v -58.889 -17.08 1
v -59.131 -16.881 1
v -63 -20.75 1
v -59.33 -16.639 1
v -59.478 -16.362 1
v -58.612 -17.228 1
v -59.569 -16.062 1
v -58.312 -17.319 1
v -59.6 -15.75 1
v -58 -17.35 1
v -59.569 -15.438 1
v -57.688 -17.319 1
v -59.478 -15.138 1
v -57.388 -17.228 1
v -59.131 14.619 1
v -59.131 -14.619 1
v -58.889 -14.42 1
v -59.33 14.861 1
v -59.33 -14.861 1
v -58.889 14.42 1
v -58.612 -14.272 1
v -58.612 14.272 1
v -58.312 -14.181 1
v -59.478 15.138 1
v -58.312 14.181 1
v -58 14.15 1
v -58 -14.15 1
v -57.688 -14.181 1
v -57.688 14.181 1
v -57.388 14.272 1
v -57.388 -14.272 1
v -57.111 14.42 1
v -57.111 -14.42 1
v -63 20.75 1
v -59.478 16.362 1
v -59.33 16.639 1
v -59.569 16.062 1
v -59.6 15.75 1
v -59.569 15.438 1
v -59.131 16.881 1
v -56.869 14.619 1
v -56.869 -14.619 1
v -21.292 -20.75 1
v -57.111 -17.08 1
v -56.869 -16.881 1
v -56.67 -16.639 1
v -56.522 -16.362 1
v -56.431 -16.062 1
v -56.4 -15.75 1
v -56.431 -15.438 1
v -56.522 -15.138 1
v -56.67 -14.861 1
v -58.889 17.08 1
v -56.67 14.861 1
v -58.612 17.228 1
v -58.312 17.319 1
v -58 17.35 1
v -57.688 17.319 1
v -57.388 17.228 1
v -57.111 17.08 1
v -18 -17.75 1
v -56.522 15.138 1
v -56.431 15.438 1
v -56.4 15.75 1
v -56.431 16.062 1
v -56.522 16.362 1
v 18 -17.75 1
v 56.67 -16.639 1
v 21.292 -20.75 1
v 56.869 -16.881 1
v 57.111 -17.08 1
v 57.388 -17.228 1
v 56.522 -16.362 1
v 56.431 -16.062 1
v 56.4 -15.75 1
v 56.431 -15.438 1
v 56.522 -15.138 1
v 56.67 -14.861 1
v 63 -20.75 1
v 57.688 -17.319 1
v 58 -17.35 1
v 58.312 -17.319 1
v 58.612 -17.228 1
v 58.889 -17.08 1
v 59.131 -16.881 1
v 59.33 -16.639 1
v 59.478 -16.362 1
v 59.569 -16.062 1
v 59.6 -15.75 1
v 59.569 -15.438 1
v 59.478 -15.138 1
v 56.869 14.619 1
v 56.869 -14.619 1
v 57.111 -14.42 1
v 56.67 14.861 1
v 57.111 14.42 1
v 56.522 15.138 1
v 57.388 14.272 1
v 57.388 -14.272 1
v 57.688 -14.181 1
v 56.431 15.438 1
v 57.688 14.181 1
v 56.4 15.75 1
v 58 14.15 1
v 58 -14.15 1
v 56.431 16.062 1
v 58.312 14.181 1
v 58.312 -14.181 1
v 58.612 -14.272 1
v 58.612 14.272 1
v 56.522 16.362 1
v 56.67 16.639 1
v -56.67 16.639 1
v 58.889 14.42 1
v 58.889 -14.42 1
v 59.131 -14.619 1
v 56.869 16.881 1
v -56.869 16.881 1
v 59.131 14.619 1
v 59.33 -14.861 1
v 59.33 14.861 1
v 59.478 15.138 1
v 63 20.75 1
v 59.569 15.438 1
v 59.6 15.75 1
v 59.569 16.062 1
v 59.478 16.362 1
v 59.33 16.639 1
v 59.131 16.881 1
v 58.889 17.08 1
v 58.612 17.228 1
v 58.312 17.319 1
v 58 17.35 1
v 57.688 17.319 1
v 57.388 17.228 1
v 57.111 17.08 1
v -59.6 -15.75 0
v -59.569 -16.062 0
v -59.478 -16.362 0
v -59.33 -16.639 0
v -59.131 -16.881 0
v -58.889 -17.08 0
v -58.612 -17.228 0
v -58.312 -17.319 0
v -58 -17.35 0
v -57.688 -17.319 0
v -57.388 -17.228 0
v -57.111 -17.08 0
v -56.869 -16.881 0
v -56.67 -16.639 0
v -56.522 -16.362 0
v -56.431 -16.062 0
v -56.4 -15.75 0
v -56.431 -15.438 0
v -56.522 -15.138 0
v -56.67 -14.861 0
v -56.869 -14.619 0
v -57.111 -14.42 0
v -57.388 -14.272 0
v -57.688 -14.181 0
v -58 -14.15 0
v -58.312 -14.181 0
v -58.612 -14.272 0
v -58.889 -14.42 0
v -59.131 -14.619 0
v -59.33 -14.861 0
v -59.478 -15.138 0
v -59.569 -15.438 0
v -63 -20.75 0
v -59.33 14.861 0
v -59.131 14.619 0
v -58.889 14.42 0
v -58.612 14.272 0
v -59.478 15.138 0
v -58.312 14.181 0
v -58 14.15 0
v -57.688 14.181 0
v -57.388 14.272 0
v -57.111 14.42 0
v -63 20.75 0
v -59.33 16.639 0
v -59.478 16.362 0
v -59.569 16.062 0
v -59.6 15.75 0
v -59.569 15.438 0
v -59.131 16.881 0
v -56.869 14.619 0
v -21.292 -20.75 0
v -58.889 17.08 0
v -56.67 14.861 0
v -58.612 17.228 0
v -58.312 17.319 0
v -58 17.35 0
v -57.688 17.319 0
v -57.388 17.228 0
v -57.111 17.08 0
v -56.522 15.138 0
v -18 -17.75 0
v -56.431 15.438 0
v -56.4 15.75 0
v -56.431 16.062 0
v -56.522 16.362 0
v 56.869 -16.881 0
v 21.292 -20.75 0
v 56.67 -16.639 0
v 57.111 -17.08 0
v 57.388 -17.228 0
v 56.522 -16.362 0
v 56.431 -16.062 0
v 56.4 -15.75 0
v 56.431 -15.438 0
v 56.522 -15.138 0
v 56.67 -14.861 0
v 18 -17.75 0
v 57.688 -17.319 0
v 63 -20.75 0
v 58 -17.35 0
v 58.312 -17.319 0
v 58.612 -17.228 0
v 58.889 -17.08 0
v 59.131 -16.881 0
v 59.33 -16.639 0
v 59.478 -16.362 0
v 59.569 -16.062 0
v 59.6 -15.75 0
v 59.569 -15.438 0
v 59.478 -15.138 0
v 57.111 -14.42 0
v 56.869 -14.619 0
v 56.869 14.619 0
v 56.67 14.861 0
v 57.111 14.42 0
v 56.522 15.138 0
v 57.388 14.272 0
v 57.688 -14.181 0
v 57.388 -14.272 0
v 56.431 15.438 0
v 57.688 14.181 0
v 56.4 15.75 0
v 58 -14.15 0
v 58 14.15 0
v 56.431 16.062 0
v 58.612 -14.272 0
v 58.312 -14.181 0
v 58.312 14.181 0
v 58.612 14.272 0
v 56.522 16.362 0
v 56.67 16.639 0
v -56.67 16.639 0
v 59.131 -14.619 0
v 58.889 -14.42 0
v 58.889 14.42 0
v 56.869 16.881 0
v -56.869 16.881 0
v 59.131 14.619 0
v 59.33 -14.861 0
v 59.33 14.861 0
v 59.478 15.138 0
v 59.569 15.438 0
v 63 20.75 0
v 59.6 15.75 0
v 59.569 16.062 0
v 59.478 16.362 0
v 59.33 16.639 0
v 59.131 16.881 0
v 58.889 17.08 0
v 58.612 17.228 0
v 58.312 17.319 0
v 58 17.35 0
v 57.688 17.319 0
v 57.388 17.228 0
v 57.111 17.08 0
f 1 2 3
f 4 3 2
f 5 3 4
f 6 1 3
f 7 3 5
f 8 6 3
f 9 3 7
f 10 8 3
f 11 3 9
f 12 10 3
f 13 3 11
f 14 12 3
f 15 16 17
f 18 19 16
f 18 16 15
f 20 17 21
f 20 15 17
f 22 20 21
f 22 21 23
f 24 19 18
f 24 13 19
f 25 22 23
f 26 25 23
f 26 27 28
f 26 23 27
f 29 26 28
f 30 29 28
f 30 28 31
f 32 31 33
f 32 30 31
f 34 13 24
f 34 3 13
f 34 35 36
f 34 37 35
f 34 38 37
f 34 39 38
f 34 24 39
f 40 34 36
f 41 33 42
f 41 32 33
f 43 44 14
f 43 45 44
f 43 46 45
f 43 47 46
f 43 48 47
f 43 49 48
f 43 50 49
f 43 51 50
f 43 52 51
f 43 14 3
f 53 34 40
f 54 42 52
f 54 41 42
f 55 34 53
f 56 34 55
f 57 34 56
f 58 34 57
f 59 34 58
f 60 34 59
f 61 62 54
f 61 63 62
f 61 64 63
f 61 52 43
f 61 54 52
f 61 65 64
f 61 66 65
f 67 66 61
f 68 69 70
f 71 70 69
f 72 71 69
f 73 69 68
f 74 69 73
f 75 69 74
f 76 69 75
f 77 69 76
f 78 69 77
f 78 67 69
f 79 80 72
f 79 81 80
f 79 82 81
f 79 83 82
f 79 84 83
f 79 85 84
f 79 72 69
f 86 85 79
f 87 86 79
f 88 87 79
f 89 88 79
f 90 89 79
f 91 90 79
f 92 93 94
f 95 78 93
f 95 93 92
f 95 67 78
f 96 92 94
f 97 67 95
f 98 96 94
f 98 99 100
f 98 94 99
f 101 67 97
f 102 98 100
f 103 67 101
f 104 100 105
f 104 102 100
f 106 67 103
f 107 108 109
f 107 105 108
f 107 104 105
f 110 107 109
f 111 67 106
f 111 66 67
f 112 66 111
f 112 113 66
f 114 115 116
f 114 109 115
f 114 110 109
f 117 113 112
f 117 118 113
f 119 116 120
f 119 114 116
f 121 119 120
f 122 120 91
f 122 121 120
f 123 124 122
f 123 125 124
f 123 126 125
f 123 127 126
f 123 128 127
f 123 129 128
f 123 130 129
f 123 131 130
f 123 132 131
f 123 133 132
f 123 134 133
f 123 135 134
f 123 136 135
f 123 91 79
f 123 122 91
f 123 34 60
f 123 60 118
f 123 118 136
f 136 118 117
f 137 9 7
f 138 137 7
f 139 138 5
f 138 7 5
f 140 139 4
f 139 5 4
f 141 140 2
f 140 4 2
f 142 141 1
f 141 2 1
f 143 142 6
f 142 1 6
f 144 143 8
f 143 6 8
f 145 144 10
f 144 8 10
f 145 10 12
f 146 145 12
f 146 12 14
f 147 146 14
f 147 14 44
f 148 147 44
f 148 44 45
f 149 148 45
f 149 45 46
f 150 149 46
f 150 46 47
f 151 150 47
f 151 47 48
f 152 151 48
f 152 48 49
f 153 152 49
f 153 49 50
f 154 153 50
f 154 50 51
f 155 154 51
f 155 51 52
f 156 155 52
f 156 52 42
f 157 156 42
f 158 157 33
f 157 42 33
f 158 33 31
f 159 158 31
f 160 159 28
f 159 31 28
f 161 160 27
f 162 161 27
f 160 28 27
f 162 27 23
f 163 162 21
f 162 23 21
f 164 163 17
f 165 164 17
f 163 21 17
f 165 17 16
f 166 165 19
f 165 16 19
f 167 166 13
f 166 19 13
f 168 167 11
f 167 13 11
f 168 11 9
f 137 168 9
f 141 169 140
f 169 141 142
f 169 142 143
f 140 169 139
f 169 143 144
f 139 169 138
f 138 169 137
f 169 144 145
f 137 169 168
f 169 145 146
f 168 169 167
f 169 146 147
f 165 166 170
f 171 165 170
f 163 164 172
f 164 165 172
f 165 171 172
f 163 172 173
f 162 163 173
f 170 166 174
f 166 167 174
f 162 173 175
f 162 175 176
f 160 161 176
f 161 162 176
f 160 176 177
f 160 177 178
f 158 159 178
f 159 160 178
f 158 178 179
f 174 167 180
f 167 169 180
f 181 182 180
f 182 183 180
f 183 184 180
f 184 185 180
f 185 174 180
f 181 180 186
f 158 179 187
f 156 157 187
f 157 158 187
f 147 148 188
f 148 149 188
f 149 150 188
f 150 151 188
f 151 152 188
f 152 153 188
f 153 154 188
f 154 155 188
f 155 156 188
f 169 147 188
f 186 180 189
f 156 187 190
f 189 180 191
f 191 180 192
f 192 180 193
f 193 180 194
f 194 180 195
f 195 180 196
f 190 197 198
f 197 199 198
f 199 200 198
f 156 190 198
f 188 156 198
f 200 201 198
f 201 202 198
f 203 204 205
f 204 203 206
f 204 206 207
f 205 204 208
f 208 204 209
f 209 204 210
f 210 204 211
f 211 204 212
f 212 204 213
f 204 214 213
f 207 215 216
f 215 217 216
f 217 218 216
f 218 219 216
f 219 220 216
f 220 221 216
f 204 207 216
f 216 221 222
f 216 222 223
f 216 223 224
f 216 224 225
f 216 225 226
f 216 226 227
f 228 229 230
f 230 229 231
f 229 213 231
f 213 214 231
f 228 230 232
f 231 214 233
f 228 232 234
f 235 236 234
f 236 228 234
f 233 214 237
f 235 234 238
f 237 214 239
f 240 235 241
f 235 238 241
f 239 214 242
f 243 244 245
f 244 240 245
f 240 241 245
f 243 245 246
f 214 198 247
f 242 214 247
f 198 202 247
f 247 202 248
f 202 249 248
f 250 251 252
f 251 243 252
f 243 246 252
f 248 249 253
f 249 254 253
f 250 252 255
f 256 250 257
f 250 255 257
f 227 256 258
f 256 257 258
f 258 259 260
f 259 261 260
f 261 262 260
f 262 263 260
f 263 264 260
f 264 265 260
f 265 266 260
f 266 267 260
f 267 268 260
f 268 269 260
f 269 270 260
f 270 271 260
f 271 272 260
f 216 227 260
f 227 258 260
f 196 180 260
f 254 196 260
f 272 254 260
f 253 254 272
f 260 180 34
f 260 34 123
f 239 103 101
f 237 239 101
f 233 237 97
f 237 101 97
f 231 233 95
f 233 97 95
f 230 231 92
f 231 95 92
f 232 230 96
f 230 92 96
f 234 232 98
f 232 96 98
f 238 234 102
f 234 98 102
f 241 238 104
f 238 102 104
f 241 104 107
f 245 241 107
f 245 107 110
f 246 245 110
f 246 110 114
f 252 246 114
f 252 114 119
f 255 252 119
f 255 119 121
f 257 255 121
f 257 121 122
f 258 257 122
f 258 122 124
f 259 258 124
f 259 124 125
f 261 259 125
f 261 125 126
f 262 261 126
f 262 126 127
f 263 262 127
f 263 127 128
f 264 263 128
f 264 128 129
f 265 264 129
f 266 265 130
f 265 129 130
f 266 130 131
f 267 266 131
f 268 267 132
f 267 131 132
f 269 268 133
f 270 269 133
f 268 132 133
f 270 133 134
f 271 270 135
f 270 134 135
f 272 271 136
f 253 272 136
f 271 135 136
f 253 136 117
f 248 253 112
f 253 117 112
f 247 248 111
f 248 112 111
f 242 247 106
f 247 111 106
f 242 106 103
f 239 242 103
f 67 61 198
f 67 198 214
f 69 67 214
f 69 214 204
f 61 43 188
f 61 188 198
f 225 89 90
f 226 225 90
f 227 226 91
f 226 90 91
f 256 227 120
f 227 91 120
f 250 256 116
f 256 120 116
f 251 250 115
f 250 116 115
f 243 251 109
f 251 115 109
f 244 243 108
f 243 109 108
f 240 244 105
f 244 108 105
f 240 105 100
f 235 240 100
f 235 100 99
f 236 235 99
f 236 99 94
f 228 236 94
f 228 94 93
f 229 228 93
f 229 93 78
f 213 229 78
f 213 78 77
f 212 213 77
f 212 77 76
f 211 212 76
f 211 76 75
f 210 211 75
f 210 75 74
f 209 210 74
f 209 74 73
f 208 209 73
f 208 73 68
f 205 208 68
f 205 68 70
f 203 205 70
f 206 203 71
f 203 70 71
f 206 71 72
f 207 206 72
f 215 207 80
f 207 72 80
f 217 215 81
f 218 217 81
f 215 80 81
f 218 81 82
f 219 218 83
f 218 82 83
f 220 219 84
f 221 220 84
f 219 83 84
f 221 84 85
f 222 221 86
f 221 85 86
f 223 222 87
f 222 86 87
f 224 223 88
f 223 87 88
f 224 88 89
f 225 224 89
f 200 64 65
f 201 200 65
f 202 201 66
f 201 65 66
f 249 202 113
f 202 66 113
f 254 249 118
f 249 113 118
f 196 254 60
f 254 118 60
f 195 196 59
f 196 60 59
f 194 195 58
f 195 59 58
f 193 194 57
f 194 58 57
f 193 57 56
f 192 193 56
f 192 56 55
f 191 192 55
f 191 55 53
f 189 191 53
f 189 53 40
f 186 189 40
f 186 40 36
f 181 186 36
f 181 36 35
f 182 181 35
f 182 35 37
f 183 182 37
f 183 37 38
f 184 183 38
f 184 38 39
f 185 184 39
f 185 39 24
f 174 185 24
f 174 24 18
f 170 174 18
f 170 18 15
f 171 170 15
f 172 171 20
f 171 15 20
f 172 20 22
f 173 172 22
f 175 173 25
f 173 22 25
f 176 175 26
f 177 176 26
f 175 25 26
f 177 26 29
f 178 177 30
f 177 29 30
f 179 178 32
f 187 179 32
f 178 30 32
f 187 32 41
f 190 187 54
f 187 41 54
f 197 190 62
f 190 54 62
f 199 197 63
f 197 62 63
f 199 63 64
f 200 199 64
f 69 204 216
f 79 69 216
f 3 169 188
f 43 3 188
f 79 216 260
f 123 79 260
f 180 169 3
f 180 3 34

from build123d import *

# Parameters (mm, degrees)
SKETCH_1_W          = 126
SKETCH_1_H          = 41.5
EXTRUDE_1_DEPTH     = 1
SKETCH_2_R          = 1.6
CUT_EXTRUDE_1_DEPTH = 67.336735675
CUT_EXTRUDE_2_DEPTH = 67.336735675


with BuildPart() as part:
    # 草图1 → 凸台-拉伸1 (new body)
    with BuildSketch(Plane.XY):
        Rectangle(SKETCH_1_W, SKETCH_1_H)
    extrude(amount=EXTRUDE_1_DEPTH)

    # 草图2 → 切除-拉伸1 (cut, through all)
    with BuildSketch(Plane.XY.offset(1)):
        with Locations((-58, 15.75)):
            Circle(SKETCH_2_R)
        with Locations(Location((-58, -15.75, 0), (0, 0, 180))):
            Circle(SKETCH_2_R)
        with Locations((58, -15.75)):
            Circle(SKETCH_2_R)
        with Locations(Location((58, 15.75, 0), (0, 0, 180))):
            Circle(SKETCH_2_R)
    extrude(amount=-CUT_EXTRUDE_1_DEPTH, mode=Mode.SUBTRACT)

    # 草图3 → 切除-拉伸2 (cut, through all)
    with BuildSketch(Plane.XY.offset(1)):
        Polygon((-21.292219163, -20.75), (-18, -17.75), (18, -17.75), (21.292219163, -20.75), align=None)
    extrude(amount=-CUT_EXTRUDE_2_DEPTH, mode=Mode.SUBTRACT)


solid = part.part
